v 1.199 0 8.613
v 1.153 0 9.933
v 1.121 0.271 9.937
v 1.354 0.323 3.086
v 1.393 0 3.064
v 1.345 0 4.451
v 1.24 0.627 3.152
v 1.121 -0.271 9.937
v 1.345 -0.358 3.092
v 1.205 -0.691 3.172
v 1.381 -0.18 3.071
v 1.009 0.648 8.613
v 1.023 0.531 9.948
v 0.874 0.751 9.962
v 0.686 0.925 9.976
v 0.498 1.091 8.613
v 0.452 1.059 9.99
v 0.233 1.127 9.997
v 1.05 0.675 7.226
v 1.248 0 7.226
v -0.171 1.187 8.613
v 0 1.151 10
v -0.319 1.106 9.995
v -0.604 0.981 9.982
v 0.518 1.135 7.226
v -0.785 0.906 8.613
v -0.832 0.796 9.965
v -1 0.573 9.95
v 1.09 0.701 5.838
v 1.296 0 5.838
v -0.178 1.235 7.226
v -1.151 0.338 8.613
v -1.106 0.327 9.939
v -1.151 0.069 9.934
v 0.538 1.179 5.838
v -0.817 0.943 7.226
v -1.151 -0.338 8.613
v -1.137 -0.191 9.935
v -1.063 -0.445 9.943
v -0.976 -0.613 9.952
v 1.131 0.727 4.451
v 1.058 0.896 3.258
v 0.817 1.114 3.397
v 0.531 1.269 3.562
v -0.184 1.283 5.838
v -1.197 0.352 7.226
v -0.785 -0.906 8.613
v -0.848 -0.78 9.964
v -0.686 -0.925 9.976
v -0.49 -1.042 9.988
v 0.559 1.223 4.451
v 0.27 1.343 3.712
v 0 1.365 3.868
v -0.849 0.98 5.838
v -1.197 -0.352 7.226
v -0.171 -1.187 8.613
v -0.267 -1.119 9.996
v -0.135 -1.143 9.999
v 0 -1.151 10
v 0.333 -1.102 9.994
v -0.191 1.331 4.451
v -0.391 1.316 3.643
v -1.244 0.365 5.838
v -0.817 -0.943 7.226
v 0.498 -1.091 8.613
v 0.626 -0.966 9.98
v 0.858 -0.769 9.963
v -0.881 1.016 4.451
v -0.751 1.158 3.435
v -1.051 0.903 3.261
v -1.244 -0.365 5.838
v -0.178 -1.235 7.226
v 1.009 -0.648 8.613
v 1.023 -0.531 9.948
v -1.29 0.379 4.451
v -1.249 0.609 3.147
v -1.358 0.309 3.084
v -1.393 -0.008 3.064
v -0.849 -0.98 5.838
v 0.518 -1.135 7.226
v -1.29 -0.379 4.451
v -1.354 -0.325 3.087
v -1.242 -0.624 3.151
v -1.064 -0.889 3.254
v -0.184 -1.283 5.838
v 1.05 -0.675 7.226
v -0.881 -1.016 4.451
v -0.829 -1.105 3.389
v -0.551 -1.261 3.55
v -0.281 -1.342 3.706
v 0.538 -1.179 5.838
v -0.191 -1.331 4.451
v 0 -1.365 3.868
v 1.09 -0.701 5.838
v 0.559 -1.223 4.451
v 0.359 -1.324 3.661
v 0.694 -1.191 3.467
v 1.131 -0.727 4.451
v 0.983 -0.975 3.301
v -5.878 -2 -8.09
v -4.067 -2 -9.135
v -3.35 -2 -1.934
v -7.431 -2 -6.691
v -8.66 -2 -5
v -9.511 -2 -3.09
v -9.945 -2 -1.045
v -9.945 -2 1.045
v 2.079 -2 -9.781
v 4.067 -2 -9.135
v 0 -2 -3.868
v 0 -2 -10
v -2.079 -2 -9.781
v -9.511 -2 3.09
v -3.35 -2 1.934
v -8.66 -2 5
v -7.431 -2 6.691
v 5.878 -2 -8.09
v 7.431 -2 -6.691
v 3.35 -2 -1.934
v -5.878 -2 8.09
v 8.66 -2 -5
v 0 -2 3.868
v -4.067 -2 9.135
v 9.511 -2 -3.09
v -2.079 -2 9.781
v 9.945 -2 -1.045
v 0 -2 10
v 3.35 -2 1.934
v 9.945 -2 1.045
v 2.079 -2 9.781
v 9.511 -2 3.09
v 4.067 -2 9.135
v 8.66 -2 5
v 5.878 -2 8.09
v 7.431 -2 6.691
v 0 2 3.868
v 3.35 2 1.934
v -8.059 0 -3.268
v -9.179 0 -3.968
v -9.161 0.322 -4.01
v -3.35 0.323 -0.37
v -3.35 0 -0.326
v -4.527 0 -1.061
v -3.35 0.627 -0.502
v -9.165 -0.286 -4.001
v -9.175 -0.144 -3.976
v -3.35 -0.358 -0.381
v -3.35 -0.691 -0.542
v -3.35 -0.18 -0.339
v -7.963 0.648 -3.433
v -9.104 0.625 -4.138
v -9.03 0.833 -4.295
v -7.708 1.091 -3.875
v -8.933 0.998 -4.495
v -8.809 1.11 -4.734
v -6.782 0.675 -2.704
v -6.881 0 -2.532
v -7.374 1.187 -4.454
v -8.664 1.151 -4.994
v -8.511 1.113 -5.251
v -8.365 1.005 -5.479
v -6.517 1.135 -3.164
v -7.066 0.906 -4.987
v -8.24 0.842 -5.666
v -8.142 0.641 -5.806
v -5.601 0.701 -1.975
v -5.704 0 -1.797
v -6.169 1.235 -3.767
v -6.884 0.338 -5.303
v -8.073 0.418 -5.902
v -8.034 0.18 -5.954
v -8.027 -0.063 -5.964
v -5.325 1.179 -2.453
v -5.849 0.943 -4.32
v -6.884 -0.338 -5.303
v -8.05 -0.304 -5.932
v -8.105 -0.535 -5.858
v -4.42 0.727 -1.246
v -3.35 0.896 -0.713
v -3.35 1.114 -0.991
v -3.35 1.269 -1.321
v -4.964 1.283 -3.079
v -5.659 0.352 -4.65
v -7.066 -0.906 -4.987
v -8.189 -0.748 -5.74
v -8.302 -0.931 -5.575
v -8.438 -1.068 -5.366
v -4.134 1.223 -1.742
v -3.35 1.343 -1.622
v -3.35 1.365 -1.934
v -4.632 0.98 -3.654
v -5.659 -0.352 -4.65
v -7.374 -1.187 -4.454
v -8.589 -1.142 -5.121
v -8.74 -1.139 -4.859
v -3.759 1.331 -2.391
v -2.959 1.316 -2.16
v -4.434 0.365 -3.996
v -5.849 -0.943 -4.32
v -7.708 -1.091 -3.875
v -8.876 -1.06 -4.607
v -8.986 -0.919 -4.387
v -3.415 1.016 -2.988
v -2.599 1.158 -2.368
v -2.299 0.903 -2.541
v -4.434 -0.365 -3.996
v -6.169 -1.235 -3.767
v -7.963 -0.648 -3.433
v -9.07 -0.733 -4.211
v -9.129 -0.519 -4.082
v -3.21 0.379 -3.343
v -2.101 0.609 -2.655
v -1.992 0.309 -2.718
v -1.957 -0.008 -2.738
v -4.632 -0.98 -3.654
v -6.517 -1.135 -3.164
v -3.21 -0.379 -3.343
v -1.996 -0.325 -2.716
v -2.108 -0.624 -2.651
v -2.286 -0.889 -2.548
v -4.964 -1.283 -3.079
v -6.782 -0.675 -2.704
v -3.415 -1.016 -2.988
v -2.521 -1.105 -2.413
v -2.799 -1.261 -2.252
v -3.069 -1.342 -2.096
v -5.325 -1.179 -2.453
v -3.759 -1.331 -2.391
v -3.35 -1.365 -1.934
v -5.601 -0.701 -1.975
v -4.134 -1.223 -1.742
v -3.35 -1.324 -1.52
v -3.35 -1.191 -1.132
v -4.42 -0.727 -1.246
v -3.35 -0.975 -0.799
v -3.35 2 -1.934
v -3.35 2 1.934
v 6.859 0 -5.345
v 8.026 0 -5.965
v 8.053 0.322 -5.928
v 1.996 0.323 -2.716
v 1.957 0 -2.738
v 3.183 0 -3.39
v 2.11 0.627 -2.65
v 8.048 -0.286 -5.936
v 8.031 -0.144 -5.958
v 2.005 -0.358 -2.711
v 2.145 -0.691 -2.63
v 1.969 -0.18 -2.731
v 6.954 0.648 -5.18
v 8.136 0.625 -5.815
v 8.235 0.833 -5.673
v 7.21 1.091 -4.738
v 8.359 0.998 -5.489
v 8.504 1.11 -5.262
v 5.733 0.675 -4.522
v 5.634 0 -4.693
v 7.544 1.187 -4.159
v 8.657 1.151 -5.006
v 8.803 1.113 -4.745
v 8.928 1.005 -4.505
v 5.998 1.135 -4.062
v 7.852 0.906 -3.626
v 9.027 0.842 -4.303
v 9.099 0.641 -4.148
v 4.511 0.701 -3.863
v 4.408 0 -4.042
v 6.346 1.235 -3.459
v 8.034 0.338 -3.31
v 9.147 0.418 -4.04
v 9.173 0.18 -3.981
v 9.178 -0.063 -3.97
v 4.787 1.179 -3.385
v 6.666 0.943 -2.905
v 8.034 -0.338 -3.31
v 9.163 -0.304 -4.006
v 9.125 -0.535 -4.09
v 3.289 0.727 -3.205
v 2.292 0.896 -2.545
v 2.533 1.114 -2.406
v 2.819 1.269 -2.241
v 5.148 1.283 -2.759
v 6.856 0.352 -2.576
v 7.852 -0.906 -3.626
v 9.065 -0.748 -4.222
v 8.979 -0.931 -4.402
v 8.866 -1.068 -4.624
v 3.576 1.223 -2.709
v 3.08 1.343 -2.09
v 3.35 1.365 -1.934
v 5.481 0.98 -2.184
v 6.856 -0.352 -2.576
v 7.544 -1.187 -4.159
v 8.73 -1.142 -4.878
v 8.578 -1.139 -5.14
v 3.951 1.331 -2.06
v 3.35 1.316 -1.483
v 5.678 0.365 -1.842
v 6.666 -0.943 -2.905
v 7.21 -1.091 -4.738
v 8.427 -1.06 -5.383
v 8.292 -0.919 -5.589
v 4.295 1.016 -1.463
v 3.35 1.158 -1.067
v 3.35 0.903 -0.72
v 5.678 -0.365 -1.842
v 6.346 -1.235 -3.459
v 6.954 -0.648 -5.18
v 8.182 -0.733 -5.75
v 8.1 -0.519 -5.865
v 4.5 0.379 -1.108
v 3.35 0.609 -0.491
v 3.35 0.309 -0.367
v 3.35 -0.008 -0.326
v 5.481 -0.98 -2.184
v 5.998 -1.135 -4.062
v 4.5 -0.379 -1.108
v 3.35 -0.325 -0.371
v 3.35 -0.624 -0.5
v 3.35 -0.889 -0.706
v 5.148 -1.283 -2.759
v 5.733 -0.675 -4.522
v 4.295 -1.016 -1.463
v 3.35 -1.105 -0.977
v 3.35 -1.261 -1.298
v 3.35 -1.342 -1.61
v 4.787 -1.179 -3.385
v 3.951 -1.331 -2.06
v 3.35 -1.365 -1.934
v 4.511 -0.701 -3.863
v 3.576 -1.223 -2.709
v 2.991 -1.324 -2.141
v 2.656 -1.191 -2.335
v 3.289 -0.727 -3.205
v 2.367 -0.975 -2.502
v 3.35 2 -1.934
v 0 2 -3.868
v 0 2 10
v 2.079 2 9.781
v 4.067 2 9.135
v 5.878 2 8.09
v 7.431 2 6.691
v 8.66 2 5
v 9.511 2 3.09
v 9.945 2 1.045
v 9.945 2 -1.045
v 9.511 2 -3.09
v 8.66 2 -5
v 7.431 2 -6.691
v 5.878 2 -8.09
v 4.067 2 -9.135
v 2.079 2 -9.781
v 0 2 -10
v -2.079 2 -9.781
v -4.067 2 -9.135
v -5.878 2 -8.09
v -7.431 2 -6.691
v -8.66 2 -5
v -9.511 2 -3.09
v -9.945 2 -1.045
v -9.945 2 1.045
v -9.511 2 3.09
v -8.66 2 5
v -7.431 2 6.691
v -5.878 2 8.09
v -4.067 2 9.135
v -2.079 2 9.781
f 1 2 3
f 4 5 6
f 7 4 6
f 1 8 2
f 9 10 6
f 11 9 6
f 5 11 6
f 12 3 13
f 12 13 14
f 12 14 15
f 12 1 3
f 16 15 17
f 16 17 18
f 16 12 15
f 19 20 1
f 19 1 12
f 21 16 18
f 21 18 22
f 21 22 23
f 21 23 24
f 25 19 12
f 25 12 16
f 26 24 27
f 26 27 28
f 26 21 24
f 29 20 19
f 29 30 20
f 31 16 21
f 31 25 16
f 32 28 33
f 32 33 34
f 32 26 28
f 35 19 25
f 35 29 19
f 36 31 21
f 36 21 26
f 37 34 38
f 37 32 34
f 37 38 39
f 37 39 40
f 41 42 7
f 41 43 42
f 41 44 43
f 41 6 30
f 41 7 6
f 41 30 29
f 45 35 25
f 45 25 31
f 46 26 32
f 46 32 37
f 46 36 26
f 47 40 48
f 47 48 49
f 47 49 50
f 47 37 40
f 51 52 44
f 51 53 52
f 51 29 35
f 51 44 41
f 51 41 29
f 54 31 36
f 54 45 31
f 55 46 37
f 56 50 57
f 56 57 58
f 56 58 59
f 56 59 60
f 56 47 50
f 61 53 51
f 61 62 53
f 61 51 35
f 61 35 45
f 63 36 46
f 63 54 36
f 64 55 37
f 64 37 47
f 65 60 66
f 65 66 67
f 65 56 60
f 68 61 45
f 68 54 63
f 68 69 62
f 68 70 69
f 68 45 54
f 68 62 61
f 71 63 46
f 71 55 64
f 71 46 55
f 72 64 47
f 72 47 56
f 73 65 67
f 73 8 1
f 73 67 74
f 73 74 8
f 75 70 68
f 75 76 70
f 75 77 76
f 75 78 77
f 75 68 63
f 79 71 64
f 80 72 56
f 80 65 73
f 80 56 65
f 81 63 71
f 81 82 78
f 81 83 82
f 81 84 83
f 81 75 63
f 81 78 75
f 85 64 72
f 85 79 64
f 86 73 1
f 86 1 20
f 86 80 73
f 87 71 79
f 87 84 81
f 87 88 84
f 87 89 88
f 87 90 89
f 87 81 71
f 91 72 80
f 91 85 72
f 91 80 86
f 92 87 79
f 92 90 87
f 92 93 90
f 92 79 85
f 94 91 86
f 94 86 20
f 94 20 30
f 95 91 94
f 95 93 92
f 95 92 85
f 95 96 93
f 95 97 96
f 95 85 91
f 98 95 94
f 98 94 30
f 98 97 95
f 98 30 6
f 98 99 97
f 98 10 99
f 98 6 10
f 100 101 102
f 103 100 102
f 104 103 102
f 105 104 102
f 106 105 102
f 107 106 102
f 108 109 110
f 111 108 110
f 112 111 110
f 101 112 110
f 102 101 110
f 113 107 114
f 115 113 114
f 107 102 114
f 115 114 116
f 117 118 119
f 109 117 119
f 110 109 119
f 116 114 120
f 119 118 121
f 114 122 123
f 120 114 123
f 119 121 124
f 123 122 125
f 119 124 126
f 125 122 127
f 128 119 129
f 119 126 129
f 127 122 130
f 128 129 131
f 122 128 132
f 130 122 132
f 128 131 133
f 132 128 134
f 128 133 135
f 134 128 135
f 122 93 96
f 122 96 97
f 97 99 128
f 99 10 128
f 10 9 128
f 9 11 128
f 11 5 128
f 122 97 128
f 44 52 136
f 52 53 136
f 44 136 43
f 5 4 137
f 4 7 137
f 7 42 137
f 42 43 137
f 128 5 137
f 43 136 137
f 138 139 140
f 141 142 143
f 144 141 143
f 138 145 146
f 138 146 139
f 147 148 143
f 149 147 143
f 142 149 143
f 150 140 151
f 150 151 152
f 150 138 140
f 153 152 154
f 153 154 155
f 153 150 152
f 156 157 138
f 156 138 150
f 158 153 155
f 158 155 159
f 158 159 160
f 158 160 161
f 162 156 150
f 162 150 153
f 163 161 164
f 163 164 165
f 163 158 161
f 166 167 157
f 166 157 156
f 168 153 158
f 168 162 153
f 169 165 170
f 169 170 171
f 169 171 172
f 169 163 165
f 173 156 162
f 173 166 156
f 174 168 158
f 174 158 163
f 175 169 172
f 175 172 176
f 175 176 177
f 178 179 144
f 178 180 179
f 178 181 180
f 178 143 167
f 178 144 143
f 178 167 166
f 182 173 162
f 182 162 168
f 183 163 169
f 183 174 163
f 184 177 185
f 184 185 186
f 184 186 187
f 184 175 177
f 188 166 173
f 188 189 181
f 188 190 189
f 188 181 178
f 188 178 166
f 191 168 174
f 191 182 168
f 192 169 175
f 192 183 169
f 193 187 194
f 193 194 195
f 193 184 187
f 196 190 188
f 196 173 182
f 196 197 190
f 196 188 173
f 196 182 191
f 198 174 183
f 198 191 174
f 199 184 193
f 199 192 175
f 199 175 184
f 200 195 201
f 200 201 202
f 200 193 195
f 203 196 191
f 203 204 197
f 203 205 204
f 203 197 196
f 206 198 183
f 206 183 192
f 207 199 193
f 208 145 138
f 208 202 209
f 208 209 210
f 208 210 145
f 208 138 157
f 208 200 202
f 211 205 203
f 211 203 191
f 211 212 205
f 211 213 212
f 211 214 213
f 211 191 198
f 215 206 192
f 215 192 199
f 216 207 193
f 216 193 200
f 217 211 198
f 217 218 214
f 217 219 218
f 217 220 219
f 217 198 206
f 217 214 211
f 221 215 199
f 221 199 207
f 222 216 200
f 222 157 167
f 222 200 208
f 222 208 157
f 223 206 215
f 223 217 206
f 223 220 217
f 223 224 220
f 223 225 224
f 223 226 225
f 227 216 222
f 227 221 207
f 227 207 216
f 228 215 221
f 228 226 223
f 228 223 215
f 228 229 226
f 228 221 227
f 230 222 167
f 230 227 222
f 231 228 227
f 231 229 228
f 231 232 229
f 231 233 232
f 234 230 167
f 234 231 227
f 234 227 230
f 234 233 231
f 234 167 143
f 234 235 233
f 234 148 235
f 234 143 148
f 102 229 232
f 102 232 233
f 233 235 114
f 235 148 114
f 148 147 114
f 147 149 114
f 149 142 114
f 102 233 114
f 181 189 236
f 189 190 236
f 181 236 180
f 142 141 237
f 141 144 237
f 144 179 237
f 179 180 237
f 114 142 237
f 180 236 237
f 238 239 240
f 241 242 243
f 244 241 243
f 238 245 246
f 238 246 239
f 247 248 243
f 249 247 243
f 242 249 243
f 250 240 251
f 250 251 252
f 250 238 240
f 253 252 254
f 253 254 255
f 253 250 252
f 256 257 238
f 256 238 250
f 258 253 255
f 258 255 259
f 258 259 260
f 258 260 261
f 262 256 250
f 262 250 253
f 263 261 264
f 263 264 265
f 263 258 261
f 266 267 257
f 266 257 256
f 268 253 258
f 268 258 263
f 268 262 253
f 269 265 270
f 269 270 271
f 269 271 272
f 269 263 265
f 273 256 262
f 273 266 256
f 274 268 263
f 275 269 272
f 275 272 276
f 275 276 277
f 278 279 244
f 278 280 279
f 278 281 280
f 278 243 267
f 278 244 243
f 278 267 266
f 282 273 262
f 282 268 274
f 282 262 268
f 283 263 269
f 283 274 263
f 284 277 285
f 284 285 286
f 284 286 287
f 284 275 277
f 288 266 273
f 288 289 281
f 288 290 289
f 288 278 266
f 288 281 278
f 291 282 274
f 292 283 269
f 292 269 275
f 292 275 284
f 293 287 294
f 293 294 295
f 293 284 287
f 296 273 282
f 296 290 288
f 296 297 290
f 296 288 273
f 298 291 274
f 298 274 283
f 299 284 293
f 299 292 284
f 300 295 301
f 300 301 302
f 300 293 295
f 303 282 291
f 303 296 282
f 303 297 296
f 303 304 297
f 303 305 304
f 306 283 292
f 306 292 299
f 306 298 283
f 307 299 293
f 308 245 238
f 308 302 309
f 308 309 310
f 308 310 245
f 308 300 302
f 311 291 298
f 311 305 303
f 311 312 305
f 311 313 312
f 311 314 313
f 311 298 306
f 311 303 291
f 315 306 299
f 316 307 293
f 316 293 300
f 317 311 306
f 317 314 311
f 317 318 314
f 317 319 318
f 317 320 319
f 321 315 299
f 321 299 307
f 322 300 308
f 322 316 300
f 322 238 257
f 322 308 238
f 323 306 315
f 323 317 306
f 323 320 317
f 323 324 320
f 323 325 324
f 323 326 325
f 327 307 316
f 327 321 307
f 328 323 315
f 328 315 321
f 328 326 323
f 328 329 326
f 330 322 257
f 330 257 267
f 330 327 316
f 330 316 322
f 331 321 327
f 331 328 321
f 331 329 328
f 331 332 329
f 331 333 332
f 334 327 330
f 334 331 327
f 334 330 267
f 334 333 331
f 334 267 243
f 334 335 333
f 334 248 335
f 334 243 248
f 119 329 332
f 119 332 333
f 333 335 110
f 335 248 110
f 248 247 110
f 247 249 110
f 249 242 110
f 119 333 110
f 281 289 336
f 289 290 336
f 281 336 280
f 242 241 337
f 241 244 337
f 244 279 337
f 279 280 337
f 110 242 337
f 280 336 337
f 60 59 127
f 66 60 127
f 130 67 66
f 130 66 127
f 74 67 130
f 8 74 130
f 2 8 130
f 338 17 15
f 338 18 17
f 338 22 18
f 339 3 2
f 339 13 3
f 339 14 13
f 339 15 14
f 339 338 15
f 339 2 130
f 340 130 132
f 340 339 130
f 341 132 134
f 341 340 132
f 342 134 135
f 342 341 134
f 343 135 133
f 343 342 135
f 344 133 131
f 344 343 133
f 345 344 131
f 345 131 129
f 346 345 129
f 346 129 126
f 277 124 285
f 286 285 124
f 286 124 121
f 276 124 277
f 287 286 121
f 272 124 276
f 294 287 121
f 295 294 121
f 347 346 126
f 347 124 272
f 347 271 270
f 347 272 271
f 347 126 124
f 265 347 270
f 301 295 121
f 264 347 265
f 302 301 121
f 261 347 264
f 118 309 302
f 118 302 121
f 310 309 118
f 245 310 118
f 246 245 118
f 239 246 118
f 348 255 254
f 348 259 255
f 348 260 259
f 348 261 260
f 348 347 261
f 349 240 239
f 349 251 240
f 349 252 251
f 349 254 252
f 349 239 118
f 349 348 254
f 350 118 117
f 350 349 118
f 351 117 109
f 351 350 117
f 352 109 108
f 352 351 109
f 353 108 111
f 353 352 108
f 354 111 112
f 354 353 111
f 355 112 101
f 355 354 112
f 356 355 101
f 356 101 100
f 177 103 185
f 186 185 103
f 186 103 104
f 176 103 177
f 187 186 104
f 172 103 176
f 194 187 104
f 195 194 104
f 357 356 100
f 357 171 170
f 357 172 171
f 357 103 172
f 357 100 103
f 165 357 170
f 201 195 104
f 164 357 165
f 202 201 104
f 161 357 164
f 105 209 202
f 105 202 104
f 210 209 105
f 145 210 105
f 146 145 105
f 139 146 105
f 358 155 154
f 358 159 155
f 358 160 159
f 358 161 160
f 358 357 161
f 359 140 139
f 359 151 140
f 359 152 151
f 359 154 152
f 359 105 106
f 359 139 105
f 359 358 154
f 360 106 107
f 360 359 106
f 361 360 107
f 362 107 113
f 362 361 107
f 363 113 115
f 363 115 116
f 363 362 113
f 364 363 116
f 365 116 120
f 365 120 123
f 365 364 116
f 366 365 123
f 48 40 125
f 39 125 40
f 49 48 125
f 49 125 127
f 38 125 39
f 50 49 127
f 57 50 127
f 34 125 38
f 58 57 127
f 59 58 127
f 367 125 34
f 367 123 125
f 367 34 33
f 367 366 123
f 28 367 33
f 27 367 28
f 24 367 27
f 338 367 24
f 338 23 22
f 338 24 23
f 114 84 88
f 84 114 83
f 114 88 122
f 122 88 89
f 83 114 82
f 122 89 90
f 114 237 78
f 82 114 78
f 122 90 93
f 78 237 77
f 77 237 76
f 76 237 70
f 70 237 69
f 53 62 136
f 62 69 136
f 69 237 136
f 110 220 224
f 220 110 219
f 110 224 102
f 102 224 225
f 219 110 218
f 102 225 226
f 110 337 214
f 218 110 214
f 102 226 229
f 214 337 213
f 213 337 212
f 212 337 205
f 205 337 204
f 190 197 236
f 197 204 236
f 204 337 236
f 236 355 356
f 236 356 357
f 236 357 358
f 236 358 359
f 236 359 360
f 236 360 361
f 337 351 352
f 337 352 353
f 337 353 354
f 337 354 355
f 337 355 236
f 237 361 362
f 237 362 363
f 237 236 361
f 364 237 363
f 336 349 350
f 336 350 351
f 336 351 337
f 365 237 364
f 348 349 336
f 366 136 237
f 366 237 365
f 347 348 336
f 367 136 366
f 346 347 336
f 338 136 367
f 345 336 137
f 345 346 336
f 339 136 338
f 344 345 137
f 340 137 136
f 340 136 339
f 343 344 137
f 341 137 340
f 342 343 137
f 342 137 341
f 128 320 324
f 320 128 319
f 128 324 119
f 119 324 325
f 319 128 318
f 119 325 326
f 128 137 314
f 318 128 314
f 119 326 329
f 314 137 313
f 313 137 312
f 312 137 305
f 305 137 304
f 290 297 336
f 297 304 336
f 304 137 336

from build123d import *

# Parameters (mm, degrees)
SKETCH1_R               = 10
BOSS_EXTRUDE1_DEPTH     = 2
CUT_EXTRUDE1_REACH      = 16.283
CUT_EXTRUDE1_END_RADIUS = 10
SKETCH2_R               = 1.5
CUT_EXTRUDE1_DRAFT      = 2
CIRPATTERN1_COUNT       = 3


with BuildPart() as part:
    # Sketch1 → Boss-Extrude1 (new, symmetric)
    with BuildSketch(Plane(origin=(0, 0, 0), x_dir=(1, 0, 0), z_dir=(0, 1, 0))):
        with Locations(Location((0, 0, 0), (0, 0, 270))):
            Circle(SKETCH1_R)
        Polygon((0, 3.868246804), (-3.35, 1.934123402), (-3.35, -1.934123402), (0, -3.868246804), (3.35, -1.934123402), (3.35, 1.934123402), align=None, mode=Mode.SUBTRACT)
    extrude(amount=BOSS_EXTRUDE1_DEPTH, both=True)

    # Cut-Extrude1: up to this cylinder (the profile starts inside it)
    cut_extrude1_end = Plane(origin=(0, 0, 0), z_dir=(0, -1, 0)) * Cylinder(CUT_EXTRUDE1_END_RADIUS, 53.566, mode=Mode.PRIVATE)



with BuildPart() as cut_extrude1_long_prism_1:
    # Sketch2 → Cut-Extrude1 (the long prism of profile 1, to be tilted and cut off)
    with BuildSketch(Plane.XY):
        Circle(SKETCH2_R)
    extrude(amount=CUT_EXTRUDE1_REACH)
    cut_extrude1_tool1_sides = [cut_extrude1_long_prism_1.faces().sort_by_distance(p)[0] for p in [
        (-1.5, 0, 8.1415),
    ]]
    draft(cut_extrude1_tool1_sides, Plane.XY, CUT_EXTRUDE1_DRAFT)  # the draft: side faces tilted about the start plane


with BuildPart() as part_1:
    add(part.part)
    cut_extrude1_tool1 = cut_extrude1_long_prism_1.part & cut_extrude1_end
    cut_extrude1 = cut_extrude1_tool1.solids().sort_by_distance((0, 0, 0))[0]
    add(cut_extrude1, mode=Mode.SUBTRACT)

    # CirPattern1: Cut-Extrude1 ×3 about axis
    cirpattern1_axis = Axis((0, 2, 0), (0, -1, 0))
    for i in range(1, CIRPATTERN1_COUNT):
        add(cut_extrude1.rotate(cirpattern1_axis, i * 360 / CIRPATTERN1_COUNT), mode=Mode.SUBTRACT)


solid = part_1.part
